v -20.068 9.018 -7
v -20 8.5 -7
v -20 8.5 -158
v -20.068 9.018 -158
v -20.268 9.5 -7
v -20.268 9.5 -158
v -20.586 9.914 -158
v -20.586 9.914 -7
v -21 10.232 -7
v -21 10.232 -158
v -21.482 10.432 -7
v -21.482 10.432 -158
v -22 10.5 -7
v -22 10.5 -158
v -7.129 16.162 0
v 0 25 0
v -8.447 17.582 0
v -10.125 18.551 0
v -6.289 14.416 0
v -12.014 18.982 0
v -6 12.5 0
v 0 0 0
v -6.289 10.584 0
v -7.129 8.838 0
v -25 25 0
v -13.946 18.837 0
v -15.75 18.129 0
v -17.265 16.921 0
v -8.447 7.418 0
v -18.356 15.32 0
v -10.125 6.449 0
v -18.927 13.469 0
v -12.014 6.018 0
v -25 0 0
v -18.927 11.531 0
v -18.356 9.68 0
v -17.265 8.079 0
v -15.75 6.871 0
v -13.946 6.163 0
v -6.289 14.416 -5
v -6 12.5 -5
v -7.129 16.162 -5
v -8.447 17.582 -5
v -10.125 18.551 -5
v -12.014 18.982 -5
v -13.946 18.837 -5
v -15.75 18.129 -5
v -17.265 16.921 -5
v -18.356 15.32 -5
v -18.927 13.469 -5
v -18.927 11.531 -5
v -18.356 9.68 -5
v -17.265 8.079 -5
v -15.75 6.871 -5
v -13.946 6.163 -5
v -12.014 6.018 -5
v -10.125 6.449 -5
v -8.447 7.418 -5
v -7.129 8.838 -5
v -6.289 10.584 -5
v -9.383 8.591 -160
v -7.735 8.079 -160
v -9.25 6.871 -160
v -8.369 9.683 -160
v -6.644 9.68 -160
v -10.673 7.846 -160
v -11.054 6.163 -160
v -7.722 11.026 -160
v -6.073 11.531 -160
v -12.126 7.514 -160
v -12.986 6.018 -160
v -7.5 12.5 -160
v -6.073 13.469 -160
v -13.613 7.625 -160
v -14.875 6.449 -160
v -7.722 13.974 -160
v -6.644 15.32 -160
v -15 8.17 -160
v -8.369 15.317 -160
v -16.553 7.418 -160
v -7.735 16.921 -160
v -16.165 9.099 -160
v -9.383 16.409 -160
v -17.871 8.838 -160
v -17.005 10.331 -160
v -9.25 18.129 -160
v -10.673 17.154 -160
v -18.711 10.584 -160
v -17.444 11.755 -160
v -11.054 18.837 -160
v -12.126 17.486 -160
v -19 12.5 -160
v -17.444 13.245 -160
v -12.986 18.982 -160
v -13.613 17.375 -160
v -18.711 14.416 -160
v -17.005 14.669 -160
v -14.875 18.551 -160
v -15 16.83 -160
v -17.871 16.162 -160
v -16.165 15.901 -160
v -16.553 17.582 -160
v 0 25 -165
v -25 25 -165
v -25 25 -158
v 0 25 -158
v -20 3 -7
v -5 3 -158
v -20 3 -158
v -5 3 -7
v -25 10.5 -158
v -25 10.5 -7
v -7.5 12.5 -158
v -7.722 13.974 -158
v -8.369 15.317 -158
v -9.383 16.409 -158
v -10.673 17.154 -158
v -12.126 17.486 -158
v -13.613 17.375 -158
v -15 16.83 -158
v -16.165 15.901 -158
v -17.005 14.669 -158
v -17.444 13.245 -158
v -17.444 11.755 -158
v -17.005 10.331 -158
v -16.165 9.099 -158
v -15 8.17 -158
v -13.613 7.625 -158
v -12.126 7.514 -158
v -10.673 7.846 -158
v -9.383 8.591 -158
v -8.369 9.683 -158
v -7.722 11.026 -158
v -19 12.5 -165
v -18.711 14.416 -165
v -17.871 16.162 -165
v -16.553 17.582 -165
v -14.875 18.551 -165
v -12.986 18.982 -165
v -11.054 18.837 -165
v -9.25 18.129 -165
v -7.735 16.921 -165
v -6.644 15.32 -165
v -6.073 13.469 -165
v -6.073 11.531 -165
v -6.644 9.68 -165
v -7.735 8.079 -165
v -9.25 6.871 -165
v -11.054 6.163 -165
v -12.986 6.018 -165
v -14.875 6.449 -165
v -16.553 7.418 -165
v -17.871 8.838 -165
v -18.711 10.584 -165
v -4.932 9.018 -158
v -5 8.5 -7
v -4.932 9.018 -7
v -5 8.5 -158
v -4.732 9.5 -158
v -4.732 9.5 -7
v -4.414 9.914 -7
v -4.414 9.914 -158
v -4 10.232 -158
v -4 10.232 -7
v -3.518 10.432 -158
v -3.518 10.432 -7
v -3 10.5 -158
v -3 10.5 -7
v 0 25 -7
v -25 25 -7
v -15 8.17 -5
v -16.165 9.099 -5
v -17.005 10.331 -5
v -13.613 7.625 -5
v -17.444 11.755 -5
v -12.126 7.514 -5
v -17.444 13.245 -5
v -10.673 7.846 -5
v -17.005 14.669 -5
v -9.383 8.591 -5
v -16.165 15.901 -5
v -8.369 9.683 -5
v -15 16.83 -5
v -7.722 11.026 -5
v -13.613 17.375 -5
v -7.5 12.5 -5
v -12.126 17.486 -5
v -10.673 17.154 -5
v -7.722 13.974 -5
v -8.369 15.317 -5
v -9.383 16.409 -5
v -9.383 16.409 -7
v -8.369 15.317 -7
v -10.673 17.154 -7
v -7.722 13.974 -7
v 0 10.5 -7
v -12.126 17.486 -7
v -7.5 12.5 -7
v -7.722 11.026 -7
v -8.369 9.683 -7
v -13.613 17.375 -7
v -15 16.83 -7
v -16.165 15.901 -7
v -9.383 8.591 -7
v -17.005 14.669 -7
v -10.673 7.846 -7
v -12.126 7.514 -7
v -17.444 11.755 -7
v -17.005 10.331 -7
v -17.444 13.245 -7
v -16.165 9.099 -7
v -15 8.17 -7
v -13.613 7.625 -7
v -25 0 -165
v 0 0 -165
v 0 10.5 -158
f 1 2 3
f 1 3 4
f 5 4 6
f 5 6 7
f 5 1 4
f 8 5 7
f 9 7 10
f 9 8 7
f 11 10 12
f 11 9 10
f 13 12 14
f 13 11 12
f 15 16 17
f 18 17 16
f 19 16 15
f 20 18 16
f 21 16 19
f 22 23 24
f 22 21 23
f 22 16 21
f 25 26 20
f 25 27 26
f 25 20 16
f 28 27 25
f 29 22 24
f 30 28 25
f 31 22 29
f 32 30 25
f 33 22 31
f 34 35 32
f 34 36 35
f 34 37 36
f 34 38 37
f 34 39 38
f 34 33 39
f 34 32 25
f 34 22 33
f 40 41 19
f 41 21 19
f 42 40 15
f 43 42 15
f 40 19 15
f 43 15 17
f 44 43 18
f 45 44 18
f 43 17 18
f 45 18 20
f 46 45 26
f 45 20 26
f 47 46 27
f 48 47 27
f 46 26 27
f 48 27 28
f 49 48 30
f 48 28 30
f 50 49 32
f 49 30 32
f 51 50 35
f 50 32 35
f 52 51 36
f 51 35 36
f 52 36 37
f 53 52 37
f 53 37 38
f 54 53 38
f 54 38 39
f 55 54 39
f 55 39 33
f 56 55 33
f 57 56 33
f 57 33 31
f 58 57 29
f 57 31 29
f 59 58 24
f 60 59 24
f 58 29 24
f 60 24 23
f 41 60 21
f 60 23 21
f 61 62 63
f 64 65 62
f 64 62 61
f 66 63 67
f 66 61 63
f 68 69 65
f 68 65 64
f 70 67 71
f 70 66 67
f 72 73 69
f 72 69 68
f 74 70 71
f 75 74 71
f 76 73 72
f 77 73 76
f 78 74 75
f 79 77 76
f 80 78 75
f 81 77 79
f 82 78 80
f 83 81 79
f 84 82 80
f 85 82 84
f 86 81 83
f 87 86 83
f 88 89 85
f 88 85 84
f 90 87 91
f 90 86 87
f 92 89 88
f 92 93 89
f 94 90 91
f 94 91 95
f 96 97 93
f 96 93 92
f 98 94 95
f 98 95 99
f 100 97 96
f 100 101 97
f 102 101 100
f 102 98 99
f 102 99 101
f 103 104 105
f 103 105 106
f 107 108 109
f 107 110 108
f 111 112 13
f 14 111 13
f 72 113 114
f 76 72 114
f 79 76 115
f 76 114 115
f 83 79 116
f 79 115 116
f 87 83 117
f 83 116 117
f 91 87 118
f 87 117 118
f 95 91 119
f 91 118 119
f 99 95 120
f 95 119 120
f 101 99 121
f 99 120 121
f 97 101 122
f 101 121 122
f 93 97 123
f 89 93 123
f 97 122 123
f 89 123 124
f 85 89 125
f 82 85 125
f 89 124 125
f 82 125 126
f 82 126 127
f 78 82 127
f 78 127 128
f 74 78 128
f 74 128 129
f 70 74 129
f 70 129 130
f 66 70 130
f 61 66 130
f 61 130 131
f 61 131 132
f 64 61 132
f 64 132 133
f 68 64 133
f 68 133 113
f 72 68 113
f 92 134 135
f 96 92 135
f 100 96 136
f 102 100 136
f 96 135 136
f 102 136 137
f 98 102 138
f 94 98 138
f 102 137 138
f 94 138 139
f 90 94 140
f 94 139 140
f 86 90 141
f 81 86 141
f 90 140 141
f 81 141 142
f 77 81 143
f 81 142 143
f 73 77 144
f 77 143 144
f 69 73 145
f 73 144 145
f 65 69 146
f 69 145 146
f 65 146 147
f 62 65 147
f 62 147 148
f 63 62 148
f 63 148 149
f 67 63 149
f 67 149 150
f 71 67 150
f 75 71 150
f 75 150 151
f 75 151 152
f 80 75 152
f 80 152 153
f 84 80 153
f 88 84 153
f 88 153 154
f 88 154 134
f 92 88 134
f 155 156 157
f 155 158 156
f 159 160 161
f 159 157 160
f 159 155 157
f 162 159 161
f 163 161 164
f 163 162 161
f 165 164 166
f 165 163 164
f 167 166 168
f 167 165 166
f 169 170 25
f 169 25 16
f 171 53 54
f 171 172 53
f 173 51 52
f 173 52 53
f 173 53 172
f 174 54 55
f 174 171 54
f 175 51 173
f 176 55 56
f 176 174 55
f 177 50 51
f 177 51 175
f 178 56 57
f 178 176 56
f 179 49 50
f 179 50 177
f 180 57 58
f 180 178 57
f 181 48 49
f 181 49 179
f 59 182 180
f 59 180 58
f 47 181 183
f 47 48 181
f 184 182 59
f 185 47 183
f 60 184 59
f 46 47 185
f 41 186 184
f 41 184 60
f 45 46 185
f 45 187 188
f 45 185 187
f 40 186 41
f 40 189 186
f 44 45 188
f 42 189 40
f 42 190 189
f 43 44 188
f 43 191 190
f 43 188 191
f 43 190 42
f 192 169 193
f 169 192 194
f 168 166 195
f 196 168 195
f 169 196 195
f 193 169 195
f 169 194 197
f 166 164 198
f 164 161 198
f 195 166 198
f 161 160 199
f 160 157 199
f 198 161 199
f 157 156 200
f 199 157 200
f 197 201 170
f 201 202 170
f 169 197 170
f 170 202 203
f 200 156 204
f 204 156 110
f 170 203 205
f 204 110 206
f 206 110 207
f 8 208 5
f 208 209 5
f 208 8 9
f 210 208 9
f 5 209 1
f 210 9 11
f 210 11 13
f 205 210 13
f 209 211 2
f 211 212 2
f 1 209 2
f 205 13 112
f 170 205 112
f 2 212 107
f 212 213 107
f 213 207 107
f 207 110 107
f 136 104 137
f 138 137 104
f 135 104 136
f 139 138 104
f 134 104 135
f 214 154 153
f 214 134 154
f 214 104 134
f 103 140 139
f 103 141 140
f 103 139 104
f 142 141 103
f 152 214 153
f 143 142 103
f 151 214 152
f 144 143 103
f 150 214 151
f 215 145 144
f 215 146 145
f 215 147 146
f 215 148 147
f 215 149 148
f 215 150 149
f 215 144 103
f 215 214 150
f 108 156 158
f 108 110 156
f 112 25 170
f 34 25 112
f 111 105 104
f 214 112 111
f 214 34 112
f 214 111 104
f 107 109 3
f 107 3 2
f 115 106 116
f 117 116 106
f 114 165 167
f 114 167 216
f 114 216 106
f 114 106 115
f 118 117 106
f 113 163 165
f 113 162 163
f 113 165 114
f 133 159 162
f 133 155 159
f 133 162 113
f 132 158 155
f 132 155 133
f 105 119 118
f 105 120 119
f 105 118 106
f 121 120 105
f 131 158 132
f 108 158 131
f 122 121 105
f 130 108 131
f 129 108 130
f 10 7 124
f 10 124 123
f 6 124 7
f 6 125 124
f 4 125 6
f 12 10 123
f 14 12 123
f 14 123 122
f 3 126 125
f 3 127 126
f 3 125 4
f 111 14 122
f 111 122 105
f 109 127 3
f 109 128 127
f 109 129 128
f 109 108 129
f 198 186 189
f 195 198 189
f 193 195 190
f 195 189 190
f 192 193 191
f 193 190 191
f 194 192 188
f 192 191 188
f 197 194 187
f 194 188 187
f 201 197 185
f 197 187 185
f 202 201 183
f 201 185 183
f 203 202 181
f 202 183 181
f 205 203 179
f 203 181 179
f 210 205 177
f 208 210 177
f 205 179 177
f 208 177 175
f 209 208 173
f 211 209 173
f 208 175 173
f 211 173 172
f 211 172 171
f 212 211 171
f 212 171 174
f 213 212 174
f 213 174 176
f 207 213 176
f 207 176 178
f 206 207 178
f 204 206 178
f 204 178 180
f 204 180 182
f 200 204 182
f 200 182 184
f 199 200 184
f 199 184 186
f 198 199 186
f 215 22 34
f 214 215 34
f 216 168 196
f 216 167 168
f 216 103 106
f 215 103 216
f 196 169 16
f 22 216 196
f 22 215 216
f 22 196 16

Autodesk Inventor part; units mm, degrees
ref_plane "YZ Plane" through (0, 0, 0) normal (1, 0, 0) x (0, 1, 0)
ref_plane "XZ Plane" through (0, 0, 0) normal (0, 1, 0) x (-1, 0, 0)
ref_plane "XY Plane" through (0, 0, 0) normal (0, 0, 1) x (1, 0, 0)
sketch "Sketch1" plane through (0, 0, 0) normal (0, 1, 0) x (-1, 0, 0)
  line L0 (0, 0) -> (25, 0)
  line L1 (25, 0) -> (25, -165)
  line L2 (25, -165) -> (0, -165)
  line L3 (0, -165) -> (0, 0)
  dimension "d0" = 25
  dimension "d1" = 165
extrude "Extrusion1" add sketch "Sketch1" along normal blind 3
sketch "Sketch2" plane through (0, 3, 0) normal (0, 1, 0) x (1, 0, 0)
  line L0 (-25, 165) -> (-25, 0) projected
  line L1 (0, 0) -> (0, 165) projected
  line L2 (-25, 0) -> (0, 0)
  line L3 (0, 0) -> (0, 7)
  line L4 (0, 7) -> (-25, 7)
  line L5 (-25, 7) -> (-25, 0)
  line L6 (0, 165) -> (-25, 165) projected
  line L7 (-25, 165) -> (0, 165)
  line L8 (0, 165) -> (0, 158)
  line L9 (0, 158) -> (-25, 158)
  line L10 (-25, 158) -> (-25, 165)
  dimension "d4" = 7
  dimension "d5" = 7
extrude "Extrusion2" add sketch "Sketch2" along normal blind 22 contours L6 L1 L9 L0 | L4 L1 L2 L0
sketch "Sketch3" plane through (-25, 0, 0) normal (0, 0, 1) x (1, 0, 0)
  point P0 (25, 0)
sketch "Sketch4" plane through (-25, 0, 0) normal (0, 0, 1) x (1, 0, 0)
  line L0 (25, 25) -> (0, 25) construction
  line L1 (25, 0) -> (0, 25) construction
  circle A0 centre (12.5, 12.5) radius 6.5
  dimension "d8" = 13
extrude "Extrusion3" cut sketch "Sketch4" against normal blind 5
sketch "Sketch5" plane through (0, 0, -165) normal (0, 0, -1) x (-1, 0, 0)
  circle A0 centre (12.5, 12.5) radius 6.5 projected
  circle A1 centre (12.5, 12.5) radius 6.5
  point P0 (0, 0)
extrude "Extrusion4" cut sketch "Sketch5" against normal blind 5
sketch "Sketch6" plane through (-25, 0, 0) normal (0, 0, 1) x (1, 0, 0)
  circle A0 centre (12.5, 12.5) radius 6.5 projected
  circle A1 centre (12.5, 12.5) radius 5
  point P0 (25, 0)
  dimension "d13" = 10
extrude "Extrusion5" cut sketch "Sketch6" against normal blind 165 contours A1
sketch "Sketch7" plane through (-25, 3, -158) normal (0, 0, 1) x (1, 0, 0)
  line L0 (25, 0) -> (25, 22) construction
  line L1 (0, 0) -> (0, 22) construction
  point P0 (25, -3)
sketch "Sketch8" plane through (-25, 3, -158) normal (0, 0, 1) x (1, 0, 0)
  circle A0 centre (12.5, 9.5) radius 5 projected
  point P0 (25, -3)
sketch "Sketch9" plane through (0, 3, 0) normal (0, 1, 0) x (1, 0, 0)
  line L0 (-25, 158) -> (0, 158) projected
  line L1 (0, 7) -> (-25, 7) projected
  line L2 (-25, 158) -> (-20, 158)
  line L3 (-20, 158) -> (-20, 7)
  line L4 (-20, 7) -> (-25, 7)
  line L5 (-25, 7) -> (-25, 158)
  line L6 (0, 0) -> (0, 7) projected
  line L7 (0, 7) -> (-5, 7)
  line L8 (-5, 7) -> (-5, 158)
  line L9 (-5, 158) -> (0, 158)
  line L10 (0, 158) -> (0, 7)
  dimension "d16" = 5
  dimension "d17" = 5
extrude "Extrusion6" add sketch "Sketch9" along normal blind 7.5 contours L0 L3 L1 L5 | L0 L10 L1 L8
fillet "Fillet1" radius 2 2 edges at (-5, 10.5, -82.5) (-20, 10.5, -82.5)
properties part number "baseAxel 11-28"
